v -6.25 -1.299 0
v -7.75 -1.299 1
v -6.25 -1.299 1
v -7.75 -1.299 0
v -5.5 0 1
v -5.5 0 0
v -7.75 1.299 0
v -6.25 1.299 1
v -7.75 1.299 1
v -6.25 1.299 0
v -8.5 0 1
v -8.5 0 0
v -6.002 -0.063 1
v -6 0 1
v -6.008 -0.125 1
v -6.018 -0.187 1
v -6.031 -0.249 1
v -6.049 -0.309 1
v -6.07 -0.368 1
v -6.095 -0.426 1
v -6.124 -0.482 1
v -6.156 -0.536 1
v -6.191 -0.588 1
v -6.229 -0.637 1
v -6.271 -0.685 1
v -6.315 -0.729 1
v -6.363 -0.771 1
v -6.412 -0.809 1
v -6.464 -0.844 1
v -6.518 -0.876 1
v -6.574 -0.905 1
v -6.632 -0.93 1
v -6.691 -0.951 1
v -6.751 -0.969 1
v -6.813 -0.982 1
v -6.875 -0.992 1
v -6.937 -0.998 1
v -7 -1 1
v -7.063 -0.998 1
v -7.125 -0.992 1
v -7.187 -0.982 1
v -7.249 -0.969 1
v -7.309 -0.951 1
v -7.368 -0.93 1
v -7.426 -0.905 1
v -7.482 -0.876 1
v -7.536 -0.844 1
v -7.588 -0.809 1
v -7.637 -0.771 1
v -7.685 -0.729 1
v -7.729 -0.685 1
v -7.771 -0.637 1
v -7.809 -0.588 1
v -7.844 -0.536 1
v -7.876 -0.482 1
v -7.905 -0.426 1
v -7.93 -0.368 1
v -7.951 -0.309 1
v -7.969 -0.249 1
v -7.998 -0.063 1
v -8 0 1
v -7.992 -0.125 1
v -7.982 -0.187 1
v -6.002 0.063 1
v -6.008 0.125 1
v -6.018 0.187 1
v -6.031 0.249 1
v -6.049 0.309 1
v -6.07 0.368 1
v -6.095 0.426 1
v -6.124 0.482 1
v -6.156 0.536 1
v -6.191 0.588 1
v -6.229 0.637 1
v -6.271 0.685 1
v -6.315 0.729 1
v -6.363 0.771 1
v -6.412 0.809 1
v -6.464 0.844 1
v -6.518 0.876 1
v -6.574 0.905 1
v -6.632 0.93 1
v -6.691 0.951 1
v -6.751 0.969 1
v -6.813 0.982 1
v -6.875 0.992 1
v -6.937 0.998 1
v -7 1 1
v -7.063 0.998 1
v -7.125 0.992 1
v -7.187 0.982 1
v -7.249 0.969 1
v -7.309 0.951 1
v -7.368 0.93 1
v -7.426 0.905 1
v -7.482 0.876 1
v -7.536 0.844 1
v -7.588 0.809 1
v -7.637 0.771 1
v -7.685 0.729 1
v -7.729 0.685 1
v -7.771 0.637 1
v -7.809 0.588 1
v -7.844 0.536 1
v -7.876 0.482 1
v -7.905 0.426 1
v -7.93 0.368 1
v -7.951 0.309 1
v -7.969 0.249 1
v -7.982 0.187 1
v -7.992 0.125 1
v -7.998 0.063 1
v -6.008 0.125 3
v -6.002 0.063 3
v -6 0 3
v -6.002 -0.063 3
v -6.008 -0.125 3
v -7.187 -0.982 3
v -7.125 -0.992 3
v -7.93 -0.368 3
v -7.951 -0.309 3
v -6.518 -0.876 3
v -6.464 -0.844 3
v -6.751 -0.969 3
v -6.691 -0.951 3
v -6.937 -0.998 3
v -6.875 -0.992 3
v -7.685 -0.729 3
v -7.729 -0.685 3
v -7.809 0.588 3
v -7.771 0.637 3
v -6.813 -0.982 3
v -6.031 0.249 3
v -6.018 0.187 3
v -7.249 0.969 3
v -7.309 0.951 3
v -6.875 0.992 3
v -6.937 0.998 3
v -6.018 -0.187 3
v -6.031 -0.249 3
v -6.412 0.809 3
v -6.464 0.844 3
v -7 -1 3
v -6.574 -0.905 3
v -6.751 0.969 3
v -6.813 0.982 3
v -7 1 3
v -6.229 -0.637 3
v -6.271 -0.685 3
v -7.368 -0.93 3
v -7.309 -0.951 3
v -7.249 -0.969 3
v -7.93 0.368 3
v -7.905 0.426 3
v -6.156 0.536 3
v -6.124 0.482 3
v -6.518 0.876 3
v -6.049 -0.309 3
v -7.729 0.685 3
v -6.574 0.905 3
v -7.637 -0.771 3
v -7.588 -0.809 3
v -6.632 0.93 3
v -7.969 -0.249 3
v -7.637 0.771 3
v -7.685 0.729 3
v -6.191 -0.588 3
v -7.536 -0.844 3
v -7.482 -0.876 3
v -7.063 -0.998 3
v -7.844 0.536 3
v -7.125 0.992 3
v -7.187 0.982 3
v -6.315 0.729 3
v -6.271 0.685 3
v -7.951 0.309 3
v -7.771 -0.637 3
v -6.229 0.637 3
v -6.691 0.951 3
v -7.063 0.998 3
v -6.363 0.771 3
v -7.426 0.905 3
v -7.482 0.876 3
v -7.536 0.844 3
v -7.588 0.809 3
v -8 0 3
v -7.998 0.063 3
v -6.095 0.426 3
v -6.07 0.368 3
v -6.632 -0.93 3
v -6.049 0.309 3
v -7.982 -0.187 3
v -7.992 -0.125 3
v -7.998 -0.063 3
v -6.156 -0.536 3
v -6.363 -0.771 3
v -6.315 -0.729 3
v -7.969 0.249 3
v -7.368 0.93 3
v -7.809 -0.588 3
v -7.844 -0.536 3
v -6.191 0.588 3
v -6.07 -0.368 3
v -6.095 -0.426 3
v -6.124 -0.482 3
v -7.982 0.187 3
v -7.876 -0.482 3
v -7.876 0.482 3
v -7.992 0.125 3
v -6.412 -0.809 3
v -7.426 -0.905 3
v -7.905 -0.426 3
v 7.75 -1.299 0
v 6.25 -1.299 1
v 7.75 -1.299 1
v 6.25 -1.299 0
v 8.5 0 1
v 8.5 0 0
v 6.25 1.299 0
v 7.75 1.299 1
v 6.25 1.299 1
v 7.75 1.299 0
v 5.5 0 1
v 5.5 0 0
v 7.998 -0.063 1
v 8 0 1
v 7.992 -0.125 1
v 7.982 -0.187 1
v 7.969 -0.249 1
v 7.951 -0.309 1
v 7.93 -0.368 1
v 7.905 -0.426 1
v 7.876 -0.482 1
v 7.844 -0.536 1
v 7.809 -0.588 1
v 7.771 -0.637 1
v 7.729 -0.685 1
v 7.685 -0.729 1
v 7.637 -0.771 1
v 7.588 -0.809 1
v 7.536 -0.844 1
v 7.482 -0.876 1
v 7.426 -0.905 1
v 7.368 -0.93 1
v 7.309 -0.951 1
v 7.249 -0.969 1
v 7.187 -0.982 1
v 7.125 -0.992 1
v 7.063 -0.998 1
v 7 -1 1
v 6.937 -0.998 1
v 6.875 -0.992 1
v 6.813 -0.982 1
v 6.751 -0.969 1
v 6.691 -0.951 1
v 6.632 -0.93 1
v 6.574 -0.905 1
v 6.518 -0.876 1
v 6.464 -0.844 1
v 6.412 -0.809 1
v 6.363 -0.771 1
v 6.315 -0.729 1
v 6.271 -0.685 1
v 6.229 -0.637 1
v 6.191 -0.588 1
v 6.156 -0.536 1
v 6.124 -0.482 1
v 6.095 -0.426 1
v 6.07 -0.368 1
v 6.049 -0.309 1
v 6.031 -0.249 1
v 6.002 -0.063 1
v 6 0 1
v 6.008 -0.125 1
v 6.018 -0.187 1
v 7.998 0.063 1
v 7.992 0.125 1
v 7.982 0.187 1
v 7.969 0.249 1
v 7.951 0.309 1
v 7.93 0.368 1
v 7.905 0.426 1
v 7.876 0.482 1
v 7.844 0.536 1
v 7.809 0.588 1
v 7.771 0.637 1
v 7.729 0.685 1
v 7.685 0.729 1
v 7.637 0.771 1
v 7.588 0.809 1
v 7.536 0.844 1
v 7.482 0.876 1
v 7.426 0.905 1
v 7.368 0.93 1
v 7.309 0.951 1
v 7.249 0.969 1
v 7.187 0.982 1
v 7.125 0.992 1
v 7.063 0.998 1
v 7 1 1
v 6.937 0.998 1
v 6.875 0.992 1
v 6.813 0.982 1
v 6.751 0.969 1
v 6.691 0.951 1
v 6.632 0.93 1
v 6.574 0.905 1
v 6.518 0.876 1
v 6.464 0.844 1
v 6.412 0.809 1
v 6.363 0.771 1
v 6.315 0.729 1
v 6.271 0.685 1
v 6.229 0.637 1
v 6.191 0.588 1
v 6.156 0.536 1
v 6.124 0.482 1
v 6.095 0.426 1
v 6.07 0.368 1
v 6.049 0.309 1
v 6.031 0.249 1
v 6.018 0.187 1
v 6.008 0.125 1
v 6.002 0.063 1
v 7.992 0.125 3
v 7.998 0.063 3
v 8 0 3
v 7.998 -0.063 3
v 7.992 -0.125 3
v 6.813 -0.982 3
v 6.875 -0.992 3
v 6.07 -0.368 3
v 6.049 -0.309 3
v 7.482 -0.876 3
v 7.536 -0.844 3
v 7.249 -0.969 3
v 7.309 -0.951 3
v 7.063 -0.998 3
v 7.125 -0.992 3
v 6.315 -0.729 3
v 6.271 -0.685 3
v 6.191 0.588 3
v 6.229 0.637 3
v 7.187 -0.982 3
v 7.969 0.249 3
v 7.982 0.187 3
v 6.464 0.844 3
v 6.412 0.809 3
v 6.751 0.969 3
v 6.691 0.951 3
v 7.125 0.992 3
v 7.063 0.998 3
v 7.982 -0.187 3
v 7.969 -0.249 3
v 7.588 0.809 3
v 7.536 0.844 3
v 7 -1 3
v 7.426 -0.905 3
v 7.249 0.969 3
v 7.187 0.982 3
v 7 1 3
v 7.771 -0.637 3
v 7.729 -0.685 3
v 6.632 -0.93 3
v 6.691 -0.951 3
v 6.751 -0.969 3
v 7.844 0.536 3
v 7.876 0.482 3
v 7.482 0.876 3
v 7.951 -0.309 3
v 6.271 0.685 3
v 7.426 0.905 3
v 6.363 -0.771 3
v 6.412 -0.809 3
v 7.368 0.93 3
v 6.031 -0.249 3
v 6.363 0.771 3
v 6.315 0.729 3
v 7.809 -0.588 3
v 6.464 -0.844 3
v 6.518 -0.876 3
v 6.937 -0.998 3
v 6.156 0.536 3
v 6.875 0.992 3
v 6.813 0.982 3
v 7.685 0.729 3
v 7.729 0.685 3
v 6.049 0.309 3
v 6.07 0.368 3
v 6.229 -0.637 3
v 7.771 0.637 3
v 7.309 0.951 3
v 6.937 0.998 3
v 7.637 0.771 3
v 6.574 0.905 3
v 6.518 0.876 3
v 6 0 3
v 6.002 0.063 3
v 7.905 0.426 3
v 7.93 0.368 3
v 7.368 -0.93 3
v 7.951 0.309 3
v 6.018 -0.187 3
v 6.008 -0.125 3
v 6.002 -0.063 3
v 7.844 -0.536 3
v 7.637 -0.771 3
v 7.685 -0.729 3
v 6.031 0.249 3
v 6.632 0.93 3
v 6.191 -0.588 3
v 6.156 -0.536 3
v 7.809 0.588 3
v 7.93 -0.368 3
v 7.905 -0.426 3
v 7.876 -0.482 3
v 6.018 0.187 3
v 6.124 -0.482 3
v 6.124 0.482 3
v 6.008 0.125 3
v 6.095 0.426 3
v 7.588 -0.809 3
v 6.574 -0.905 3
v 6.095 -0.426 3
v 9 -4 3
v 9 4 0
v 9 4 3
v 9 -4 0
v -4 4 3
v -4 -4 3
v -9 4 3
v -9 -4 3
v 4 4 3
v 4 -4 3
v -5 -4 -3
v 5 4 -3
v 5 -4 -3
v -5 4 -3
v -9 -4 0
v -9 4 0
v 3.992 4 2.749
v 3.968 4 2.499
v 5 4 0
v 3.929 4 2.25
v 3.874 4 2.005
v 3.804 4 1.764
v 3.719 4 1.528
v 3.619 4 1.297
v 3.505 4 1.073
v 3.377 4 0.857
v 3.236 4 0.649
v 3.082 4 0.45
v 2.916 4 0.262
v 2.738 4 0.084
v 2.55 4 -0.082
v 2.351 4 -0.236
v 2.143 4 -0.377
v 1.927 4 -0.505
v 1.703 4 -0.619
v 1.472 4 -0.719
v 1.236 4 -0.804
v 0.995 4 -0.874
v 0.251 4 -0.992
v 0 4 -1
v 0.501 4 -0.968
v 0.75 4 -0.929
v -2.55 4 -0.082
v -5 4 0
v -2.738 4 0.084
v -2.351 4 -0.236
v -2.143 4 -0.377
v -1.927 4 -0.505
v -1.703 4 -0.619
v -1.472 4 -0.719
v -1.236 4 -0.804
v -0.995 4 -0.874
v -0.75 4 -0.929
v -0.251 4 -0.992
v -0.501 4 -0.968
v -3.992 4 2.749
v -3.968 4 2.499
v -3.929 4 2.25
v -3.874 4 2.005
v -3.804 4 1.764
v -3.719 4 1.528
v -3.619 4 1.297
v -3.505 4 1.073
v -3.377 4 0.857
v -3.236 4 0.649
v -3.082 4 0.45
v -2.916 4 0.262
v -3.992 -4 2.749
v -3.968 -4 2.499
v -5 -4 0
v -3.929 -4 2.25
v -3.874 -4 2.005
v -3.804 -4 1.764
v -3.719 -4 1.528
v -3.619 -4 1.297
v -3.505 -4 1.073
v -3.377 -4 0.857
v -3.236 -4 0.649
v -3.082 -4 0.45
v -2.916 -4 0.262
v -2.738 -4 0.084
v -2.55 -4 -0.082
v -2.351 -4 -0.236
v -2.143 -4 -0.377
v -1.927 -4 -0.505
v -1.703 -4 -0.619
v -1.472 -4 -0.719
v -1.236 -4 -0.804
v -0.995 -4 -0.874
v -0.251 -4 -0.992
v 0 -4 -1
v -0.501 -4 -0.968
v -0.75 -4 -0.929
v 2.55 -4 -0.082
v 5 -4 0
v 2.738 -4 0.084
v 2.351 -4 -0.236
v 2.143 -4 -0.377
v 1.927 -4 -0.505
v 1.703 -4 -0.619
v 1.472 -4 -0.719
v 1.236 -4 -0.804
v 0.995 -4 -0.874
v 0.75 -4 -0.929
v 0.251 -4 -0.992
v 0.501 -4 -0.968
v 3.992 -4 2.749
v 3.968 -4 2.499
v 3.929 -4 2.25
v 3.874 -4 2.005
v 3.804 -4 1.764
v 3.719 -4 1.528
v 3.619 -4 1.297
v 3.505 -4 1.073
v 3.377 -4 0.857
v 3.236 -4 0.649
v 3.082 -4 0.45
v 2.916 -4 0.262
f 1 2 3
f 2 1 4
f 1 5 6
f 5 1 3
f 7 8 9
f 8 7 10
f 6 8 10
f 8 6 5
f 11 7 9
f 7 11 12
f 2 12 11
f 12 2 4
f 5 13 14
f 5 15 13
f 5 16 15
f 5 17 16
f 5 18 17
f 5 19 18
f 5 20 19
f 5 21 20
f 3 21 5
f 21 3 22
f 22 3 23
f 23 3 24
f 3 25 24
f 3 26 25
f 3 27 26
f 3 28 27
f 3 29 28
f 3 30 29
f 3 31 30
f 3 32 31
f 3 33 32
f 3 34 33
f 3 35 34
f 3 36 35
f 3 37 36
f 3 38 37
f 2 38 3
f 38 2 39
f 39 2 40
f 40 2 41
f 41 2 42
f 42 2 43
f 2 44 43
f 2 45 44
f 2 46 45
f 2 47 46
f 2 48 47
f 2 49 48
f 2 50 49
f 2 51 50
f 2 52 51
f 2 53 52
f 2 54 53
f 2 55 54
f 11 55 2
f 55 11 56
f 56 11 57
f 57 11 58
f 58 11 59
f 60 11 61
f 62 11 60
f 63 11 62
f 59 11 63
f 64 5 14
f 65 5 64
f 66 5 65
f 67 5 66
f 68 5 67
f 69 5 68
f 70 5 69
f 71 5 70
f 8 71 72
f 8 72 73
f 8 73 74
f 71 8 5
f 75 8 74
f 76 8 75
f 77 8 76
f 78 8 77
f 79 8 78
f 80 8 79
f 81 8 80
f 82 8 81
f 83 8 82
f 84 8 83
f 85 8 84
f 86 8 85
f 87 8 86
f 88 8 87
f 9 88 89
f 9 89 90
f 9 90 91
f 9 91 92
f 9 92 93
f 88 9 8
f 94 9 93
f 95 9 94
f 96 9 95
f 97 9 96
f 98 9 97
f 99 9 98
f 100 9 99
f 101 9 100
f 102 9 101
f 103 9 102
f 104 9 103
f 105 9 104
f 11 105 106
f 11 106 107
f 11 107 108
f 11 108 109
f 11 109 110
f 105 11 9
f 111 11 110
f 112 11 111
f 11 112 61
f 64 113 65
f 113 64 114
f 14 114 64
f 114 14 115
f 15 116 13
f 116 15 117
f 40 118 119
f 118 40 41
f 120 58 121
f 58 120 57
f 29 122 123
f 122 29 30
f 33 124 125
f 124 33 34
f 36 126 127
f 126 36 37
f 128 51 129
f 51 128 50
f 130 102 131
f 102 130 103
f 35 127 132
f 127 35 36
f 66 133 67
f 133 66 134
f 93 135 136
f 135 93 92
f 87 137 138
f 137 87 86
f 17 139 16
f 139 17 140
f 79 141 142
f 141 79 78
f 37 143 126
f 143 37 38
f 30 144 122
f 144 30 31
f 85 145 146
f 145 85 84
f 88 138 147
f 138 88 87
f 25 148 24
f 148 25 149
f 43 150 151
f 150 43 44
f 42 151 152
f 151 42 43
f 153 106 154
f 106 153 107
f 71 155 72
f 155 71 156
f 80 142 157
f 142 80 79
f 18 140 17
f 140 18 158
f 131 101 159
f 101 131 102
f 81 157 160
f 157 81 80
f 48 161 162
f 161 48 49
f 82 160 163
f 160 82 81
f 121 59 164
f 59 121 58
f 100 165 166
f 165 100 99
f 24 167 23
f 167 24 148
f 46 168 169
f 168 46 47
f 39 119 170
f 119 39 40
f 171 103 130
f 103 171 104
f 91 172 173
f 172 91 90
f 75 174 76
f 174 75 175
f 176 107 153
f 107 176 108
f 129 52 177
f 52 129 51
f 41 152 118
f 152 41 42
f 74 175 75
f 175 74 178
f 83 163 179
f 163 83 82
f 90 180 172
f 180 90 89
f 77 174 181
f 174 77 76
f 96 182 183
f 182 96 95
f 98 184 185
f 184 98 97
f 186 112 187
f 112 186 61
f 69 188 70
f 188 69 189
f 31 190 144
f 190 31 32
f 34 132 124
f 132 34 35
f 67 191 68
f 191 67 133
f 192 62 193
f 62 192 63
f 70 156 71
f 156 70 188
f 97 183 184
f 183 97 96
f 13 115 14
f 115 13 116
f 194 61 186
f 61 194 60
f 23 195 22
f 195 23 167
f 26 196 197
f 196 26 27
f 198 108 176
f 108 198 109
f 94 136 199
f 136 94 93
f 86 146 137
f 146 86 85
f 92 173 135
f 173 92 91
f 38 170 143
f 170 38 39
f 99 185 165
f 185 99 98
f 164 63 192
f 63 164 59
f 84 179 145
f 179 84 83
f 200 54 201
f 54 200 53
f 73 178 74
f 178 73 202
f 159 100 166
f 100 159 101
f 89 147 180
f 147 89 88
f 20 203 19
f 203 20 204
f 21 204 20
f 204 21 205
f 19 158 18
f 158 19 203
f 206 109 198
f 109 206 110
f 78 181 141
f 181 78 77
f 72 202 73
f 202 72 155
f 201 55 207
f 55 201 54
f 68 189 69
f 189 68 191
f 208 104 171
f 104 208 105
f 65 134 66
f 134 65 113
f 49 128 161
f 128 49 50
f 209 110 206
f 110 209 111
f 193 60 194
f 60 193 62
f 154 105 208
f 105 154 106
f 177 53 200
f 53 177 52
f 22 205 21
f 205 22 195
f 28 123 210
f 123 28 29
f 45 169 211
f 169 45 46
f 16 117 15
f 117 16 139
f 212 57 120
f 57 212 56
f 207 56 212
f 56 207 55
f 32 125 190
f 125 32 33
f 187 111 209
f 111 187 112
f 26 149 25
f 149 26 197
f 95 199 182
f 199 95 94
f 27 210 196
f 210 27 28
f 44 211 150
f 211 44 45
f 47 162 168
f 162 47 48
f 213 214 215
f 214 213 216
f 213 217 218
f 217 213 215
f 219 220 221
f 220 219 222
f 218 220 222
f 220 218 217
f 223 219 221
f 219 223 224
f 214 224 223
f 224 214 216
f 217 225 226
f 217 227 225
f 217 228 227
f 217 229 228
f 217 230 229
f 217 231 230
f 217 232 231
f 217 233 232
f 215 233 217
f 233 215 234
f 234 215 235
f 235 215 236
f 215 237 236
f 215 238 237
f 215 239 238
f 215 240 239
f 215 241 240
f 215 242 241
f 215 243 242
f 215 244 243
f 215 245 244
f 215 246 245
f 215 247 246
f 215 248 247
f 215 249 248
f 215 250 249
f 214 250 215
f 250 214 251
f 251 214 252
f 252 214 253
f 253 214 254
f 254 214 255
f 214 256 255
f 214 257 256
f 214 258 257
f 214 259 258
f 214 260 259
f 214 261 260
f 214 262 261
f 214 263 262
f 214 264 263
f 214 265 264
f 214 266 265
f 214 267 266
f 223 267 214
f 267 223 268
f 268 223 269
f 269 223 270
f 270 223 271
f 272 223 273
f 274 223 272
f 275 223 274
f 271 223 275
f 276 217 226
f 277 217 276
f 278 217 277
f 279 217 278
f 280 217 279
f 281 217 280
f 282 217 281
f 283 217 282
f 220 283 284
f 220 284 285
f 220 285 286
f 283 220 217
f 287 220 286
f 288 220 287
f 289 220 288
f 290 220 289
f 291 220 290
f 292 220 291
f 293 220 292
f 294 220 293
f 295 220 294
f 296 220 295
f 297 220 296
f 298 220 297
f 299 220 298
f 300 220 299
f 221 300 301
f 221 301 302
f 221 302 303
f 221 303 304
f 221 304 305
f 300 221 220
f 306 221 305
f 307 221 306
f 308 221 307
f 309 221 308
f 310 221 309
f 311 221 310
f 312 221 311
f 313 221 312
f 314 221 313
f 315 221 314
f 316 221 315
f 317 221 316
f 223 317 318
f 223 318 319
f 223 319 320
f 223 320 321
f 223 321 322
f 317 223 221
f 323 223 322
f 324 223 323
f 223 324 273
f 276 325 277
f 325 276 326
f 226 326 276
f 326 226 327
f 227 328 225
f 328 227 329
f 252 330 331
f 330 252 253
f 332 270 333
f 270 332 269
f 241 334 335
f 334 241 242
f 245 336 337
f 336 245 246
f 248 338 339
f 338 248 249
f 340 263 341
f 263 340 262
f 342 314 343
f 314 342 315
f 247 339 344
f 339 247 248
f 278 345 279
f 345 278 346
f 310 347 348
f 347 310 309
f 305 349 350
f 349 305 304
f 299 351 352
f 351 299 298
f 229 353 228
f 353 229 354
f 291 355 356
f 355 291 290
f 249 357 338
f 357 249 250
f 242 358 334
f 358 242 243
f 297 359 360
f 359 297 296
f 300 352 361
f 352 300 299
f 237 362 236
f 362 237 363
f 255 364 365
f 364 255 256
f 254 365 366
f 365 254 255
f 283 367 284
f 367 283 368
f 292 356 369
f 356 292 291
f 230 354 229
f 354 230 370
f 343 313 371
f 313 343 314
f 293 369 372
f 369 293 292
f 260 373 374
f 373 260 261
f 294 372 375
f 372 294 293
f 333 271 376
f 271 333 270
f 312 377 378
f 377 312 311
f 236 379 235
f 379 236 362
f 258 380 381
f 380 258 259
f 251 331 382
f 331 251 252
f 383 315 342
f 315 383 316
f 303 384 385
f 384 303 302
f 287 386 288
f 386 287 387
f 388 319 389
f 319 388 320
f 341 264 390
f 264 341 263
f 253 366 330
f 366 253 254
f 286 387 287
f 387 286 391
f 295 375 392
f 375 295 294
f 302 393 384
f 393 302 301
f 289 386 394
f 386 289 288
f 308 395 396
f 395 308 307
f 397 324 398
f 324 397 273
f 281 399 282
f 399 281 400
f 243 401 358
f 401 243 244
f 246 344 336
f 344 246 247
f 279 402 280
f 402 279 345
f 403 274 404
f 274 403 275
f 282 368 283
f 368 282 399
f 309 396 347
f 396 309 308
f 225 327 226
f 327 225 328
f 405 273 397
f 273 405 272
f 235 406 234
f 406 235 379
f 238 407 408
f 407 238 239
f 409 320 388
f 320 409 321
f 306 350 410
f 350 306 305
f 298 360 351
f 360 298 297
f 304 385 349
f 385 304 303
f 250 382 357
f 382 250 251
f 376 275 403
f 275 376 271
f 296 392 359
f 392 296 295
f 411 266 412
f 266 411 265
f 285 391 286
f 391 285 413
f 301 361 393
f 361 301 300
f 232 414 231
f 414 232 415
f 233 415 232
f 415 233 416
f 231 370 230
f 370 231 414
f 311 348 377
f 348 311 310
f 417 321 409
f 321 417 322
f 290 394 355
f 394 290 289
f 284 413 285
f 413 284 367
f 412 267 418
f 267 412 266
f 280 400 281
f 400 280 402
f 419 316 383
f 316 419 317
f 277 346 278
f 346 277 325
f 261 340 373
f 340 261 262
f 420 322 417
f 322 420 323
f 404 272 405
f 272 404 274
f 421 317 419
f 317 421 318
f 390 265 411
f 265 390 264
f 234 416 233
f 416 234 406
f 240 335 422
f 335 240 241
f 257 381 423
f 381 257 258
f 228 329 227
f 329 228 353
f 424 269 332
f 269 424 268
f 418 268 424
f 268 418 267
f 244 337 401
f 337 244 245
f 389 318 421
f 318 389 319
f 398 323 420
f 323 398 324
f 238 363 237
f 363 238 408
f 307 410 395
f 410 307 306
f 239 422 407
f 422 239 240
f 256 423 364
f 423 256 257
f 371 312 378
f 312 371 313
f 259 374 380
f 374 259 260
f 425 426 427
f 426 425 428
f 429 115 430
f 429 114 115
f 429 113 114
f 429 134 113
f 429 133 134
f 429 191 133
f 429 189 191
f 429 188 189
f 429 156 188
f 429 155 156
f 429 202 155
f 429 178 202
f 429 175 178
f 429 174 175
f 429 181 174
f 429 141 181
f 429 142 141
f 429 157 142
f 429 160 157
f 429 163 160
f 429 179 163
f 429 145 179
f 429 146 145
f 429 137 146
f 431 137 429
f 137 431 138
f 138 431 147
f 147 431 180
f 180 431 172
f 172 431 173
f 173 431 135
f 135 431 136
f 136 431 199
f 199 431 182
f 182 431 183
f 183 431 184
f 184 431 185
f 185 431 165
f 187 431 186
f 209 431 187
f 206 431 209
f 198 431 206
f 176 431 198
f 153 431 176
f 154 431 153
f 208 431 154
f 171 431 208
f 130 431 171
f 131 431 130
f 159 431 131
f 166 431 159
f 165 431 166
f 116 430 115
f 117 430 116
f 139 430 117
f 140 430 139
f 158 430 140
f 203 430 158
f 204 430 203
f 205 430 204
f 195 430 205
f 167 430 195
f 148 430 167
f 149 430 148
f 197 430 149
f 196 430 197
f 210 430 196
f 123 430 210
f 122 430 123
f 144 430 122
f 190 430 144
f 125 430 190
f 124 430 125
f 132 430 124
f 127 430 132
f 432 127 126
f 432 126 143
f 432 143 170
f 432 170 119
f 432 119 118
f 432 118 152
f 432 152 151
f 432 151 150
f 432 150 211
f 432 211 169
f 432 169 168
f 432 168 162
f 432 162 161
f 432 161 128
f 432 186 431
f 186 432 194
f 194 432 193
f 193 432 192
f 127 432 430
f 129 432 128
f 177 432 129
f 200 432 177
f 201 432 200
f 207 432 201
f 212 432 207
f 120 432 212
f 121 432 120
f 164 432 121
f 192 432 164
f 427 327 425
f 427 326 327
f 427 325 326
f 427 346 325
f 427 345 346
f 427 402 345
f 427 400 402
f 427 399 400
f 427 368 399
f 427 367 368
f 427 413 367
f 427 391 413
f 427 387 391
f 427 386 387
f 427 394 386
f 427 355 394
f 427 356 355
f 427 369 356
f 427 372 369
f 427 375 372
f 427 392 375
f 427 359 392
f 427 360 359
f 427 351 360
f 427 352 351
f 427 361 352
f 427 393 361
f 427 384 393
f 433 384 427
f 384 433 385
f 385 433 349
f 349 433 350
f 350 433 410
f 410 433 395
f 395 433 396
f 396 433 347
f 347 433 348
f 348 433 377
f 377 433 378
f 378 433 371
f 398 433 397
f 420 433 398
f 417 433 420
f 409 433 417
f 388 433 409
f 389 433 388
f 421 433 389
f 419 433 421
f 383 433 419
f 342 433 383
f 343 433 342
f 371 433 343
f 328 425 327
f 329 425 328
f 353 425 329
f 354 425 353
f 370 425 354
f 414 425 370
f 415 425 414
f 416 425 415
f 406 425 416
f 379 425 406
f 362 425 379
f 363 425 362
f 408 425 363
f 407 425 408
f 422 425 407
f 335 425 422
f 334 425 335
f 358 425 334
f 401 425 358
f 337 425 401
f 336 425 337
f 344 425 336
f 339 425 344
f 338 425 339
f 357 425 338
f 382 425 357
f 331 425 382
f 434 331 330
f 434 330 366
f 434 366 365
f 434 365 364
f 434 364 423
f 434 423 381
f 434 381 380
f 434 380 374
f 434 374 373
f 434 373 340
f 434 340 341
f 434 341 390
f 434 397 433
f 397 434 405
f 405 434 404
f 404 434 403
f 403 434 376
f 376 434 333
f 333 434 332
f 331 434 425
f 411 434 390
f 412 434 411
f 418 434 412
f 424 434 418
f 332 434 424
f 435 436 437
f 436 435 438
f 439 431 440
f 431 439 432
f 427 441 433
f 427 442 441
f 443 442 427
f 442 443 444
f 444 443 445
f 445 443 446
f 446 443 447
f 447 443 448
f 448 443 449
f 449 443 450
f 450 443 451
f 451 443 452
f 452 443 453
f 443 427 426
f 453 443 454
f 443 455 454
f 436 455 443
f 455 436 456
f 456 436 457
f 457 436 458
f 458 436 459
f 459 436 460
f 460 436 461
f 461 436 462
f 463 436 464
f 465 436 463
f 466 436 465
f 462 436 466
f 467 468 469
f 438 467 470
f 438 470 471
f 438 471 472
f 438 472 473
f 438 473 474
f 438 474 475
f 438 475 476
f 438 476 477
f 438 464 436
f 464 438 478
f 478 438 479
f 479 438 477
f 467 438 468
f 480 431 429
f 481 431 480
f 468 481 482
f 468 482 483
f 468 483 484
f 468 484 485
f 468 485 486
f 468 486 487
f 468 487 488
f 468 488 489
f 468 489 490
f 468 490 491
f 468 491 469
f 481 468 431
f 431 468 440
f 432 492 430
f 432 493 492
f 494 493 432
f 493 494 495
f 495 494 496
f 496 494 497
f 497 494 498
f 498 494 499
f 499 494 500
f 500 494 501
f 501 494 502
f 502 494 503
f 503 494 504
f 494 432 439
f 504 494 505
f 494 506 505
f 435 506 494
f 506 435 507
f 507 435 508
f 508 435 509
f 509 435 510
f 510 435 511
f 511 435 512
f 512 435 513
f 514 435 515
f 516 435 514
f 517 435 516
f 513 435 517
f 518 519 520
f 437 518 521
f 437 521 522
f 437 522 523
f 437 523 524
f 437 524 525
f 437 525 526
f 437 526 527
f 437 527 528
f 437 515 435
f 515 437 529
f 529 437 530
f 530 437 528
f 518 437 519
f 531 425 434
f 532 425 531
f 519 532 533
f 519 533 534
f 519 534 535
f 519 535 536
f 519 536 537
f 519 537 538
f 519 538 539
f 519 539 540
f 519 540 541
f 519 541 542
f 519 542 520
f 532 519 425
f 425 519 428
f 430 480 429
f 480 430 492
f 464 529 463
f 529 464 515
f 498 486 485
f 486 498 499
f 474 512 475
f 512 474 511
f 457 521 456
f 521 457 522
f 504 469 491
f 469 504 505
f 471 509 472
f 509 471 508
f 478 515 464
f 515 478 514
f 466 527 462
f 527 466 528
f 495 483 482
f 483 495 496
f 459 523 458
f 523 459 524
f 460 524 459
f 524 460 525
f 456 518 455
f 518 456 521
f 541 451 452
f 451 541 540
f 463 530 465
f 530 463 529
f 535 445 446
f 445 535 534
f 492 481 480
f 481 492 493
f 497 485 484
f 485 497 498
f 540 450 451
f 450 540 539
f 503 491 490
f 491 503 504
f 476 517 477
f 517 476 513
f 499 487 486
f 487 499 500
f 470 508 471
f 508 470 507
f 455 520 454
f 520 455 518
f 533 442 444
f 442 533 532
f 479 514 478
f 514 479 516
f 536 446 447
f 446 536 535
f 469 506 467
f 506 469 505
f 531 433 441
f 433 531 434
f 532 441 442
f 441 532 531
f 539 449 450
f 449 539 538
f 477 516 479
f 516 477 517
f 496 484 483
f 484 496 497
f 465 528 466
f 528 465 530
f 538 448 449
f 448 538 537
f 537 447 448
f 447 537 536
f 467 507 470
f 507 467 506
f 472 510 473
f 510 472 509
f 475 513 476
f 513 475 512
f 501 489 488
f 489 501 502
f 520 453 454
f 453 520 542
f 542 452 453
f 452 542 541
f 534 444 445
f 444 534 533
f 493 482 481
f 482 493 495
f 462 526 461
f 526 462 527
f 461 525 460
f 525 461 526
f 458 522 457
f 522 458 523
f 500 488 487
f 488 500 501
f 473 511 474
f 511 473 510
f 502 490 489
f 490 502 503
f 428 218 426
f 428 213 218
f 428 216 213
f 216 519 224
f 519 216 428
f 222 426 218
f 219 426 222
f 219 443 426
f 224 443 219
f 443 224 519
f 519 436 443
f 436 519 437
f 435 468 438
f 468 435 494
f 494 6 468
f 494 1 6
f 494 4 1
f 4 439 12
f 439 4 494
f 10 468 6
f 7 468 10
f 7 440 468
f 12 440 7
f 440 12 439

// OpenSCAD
internal_rad = 4;
base_width = 18;

difference() {
	// base cube
	cube([base_width, 8, 6], center=true);
	// cylinder difference for handlbar
	translate([0,5,3])
		rotate([90,0,0]) cylinder(h=9, r=internal_rad, $fn=100);
	// cube difference to remove extra volume
	translate([7,0,-2])
		cube([4,8,4], center=true);
	translate([-7,0,-2])
		cube([4,8,4], center=true);
	translate([-7,0,0]) {
		cylinder(h=2, r=1.5, center=true, $fn=6);
		cylinder(h=8, r=1, center=true, $fn=100);
	}
	translate([7,0,0]) {
		cylinder(h=2, r=1.5, center=true, $fn=6);
		cylinder(h=8, r=1, center=true, $fn=100);
	}
}
